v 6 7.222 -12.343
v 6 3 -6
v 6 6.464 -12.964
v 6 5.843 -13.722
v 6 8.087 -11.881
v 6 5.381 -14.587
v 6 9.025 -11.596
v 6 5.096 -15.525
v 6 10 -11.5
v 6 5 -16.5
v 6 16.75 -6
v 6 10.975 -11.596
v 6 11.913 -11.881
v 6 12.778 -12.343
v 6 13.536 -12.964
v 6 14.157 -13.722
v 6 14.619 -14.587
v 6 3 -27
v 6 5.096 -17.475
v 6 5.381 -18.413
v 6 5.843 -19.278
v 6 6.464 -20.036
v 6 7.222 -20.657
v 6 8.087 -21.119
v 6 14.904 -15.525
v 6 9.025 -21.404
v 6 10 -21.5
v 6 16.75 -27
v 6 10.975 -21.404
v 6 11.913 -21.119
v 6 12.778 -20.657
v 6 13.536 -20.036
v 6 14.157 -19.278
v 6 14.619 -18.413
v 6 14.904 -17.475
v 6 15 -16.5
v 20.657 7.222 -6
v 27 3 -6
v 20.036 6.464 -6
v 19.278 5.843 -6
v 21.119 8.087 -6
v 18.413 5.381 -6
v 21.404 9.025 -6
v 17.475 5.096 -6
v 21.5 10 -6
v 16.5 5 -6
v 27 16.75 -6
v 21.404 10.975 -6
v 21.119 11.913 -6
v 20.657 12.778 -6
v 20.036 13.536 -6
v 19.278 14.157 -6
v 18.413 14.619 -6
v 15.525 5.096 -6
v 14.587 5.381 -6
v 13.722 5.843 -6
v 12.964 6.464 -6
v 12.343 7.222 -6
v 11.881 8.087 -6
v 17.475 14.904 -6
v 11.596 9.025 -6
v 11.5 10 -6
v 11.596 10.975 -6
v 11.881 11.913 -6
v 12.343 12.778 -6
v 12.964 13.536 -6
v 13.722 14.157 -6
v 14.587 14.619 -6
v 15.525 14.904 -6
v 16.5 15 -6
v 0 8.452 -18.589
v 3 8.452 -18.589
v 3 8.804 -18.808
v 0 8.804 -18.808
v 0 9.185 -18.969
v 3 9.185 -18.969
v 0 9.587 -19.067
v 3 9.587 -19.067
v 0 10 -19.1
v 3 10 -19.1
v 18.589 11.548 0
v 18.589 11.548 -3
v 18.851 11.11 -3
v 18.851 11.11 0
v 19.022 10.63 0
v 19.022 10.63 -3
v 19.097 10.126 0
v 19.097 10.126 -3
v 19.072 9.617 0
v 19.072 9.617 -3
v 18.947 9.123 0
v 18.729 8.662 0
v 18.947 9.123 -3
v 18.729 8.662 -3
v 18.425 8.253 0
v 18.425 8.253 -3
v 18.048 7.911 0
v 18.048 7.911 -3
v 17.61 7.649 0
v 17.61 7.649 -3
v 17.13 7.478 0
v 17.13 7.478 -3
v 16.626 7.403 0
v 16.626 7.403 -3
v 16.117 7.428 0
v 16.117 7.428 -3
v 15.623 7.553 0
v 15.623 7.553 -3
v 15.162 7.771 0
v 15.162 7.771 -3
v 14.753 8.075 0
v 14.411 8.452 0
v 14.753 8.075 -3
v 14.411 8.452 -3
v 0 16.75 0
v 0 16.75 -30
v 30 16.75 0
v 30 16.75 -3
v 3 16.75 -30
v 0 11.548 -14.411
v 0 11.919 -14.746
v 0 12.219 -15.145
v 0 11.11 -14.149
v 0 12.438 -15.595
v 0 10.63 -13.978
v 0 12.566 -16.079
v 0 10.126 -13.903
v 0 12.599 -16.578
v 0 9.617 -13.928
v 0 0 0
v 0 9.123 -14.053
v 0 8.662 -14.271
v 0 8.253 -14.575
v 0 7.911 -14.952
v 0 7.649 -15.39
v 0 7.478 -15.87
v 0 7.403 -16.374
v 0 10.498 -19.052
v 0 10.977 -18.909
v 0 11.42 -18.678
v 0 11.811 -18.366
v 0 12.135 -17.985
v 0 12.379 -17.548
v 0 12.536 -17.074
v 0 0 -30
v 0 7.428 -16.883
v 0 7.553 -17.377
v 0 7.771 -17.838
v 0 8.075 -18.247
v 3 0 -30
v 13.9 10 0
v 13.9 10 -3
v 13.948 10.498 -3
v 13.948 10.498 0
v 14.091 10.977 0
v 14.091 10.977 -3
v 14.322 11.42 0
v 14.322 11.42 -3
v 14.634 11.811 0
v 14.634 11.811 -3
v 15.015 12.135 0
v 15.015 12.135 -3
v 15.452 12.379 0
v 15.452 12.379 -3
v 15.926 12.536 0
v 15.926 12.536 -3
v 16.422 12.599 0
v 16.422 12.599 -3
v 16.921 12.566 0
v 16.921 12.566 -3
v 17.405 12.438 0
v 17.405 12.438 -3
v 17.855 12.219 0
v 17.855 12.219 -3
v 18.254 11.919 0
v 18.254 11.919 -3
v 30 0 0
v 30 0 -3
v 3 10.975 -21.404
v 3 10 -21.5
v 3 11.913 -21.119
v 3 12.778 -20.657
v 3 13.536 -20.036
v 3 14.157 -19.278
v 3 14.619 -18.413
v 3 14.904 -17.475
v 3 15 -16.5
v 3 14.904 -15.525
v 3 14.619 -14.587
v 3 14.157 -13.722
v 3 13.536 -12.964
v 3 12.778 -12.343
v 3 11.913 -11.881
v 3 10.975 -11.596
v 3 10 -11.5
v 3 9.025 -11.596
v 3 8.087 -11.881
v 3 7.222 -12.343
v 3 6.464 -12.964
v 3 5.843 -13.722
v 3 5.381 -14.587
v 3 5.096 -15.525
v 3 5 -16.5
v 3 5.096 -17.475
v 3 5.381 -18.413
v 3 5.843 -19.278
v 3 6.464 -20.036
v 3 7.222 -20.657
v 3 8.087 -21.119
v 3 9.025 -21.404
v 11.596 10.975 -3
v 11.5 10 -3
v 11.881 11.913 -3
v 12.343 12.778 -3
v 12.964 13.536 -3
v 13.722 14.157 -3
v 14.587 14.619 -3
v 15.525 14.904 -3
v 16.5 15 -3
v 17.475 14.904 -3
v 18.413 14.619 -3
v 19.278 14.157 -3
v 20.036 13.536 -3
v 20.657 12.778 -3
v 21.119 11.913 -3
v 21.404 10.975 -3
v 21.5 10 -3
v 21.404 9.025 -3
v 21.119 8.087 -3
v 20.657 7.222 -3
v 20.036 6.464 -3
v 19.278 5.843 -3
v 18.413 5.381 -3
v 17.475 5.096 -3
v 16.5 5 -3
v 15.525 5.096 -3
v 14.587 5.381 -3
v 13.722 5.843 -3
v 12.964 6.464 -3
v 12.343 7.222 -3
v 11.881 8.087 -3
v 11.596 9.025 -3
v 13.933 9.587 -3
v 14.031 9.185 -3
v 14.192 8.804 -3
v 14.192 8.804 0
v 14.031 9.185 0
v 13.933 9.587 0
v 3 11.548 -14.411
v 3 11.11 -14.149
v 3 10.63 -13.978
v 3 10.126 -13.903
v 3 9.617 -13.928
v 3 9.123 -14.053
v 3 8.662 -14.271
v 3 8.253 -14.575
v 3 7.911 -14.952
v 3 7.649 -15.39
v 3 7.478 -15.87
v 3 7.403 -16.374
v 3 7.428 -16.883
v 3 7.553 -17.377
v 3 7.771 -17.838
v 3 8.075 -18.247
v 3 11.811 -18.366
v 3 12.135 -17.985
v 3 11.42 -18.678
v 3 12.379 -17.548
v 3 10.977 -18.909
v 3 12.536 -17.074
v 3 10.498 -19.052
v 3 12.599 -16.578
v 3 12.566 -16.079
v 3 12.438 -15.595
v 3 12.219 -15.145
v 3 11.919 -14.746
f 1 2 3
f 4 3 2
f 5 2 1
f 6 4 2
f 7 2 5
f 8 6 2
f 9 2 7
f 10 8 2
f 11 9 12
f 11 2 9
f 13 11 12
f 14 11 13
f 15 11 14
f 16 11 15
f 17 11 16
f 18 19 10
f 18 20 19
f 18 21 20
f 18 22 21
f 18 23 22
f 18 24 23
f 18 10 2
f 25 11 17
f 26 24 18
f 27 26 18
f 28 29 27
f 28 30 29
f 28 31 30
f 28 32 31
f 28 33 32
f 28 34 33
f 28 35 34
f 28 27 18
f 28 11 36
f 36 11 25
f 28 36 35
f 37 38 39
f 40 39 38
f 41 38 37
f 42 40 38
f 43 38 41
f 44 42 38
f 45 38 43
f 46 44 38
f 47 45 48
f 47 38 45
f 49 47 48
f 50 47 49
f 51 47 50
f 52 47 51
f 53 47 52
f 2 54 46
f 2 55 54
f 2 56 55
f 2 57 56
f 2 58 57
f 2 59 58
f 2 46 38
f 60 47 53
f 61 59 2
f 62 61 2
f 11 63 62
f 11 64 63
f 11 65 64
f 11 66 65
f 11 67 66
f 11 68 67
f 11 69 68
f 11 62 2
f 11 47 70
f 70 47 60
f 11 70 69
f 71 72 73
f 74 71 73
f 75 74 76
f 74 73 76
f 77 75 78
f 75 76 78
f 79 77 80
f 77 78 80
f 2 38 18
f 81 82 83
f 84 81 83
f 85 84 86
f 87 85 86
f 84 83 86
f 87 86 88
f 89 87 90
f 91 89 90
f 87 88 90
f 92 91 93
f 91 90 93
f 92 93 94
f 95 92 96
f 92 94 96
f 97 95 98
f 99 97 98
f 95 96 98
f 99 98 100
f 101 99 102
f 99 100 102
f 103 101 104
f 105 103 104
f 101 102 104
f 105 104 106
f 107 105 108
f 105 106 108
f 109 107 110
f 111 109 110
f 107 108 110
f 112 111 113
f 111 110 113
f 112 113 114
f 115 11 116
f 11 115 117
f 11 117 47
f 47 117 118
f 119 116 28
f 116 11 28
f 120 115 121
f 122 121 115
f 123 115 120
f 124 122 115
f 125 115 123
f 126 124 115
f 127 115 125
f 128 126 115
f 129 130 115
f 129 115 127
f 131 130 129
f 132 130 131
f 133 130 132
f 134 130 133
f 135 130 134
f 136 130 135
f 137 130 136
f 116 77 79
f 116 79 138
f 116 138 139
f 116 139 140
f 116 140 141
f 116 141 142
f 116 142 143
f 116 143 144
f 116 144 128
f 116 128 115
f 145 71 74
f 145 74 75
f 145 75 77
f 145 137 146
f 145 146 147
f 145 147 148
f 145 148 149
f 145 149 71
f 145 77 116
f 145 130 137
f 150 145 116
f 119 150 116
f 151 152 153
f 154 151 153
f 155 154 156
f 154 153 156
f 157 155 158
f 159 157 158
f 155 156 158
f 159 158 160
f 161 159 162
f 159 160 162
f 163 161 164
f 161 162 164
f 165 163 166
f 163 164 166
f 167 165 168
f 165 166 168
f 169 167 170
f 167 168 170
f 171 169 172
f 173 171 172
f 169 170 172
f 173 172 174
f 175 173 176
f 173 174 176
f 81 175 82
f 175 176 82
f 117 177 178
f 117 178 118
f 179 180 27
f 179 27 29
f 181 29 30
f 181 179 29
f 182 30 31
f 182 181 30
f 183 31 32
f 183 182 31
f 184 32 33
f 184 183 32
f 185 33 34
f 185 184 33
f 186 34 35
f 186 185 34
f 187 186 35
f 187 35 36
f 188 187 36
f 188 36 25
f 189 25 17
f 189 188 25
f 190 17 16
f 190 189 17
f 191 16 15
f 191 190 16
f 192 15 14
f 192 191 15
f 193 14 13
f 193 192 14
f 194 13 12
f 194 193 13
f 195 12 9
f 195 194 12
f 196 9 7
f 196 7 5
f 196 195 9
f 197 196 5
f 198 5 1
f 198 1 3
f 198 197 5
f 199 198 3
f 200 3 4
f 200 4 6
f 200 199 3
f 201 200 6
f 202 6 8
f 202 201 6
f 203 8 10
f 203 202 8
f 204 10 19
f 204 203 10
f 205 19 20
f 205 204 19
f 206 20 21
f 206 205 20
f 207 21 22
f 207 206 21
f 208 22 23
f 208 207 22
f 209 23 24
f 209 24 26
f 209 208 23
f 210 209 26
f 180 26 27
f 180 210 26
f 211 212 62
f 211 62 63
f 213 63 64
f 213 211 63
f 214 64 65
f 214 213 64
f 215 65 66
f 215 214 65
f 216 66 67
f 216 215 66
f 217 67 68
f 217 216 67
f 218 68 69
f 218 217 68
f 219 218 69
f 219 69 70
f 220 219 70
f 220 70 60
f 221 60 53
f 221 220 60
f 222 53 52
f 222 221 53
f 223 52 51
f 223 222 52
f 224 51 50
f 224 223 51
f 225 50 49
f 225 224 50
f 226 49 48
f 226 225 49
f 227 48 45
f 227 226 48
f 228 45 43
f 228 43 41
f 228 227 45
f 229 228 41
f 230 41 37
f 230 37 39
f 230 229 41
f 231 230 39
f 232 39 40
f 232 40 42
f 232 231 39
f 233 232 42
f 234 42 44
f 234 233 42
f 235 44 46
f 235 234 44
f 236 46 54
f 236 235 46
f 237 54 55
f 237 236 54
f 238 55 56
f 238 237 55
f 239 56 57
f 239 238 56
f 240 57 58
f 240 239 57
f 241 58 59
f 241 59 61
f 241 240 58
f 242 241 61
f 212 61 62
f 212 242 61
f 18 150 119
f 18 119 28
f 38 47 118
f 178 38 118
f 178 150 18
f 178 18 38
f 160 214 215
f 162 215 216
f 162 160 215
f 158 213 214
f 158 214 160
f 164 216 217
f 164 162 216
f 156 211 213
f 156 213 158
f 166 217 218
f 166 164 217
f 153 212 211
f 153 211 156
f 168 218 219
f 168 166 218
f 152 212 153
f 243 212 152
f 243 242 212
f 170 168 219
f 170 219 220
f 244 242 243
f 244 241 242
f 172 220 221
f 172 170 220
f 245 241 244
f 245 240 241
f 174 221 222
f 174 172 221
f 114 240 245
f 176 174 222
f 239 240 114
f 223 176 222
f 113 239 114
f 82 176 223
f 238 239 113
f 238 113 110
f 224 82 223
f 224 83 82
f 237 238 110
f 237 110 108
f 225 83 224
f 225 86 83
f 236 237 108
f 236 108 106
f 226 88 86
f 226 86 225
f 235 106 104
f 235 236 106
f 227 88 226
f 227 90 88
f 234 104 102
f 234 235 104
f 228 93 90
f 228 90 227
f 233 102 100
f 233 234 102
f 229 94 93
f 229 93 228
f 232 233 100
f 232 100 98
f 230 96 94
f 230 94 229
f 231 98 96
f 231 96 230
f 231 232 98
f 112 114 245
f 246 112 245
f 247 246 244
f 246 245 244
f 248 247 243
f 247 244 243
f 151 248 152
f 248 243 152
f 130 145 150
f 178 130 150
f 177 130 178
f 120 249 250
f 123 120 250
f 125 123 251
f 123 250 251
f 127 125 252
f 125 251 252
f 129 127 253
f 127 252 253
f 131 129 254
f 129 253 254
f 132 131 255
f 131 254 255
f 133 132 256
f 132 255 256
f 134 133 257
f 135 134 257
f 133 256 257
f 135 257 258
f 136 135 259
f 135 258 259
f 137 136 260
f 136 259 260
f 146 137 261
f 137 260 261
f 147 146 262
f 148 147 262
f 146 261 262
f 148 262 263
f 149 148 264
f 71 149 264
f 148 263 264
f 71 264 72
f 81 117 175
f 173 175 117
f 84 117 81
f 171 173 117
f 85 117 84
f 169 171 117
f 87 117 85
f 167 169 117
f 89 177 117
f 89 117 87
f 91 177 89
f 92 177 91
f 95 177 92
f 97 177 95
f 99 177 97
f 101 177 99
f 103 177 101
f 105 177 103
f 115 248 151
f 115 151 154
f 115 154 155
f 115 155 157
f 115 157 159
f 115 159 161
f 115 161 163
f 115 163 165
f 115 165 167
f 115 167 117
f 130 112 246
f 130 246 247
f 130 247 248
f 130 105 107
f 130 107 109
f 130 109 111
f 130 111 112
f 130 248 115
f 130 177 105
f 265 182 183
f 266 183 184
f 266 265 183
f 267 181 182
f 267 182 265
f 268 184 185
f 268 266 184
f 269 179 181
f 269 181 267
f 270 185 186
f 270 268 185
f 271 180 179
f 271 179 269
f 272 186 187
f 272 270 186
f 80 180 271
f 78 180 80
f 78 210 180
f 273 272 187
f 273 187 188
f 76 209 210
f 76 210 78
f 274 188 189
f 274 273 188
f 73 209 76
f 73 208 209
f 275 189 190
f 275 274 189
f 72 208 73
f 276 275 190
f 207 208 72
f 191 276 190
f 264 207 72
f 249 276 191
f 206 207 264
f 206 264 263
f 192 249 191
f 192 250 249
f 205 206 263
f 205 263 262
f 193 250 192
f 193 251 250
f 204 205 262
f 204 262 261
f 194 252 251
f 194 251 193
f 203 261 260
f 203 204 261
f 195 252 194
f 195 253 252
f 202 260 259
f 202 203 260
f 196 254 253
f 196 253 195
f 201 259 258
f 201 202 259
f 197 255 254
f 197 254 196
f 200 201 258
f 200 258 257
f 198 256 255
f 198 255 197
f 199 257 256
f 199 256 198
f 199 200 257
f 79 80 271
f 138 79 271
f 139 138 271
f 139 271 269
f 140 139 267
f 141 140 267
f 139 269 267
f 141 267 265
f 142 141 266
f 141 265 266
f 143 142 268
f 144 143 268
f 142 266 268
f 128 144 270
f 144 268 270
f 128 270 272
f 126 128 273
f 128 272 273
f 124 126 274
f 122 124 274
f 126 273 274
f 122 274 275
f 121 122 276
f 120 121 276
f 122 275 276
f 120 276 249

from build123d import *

# Parameters (mm, degrees)
EXTRUDE_1_DEPTH     = 20
EXTRUDE_2_DEPTH     = 2
CUT_EXTRUDE_2_DEPTH = 30
CUT_EXTRUDE_3_DEPTH = 30
SKETCH_8_W          = 27
SKETCH_8_H          = 18
SKETCH_8_R          = 5
EXTRUDE_3_DEPTH     = 3
SKETCH_9_W          = 24
SKETCH_9_H          = 18
SKETCH_9_R          = 5
EXTRUDE_4_DEPTH     = 3
CUT_EXTRUDE_4_DEPTH = 30
SKETCH_12_W         = 30
SKETCH_12_H         = 3.25
CUT_EXTRUDE_5_DEPTH = 30
EXTRUDE_5_DEPTH     = 3


with BuildPart() as part:
    # 草图1 → 凸台-拉伸1 (new body)
    with BuildSketch(Plane(origin=(0, 0, 0), x_dir=(1, 0, 0), z_dir=(0, 1, 0))):
        Polygon((0, 0), (0, 30), (3, 30), (3, 3), (30, 3), (30, 0), align=None)
    extrude(amount=EXTRUDE_1_DEPTH)

    # 草图2 → 凸台-拉伸2 (add)
    with BuildSketch(Plane.XZ):
        Polygon((3, -30), (30, -3), (3, -3), align=None)
    extrude(amount=-EXTRUDE_2_DEPTH)

    # 草图5 → 切除-拉伸2 (cut)
    with BuildSketch(Plane(origin=(0, 0, -3), x_dir=(-1, 0, 0), z_dir=(0, 0, -1))):
        with BuildLine():
            ThreePointArc((-13.9, 10), (-15.685152354, 12.469012619), (-18.589248703, 11.547591632))
            Line((-18.589248703, 11.547591632), (-14.410751297, 8.452408368))
            ThreePointArc((-14.410751297, 8.452408368), (-14.030987381, 9.185152354), (-13.9, 10))
        make_face()
        with BuildLine():
            Line((-14.410751297, 8.452408368), (-18.589248703, 11.547591632))
            ThreePointArc((-18.589248703, 11.547591632), (-18.047591632, 7.910751297), (-14.410751297, 8.452408368))
        make_face()
    extrude(amount=-CUT_EXTRUDE_2_DEPTH, mode=Mode.SUBTRACT)

    # 草图7 → 切除-拉伸3 (cut)
    with BuildSketch(Plane(origin=(3, 0, 0), x_dir=(0, 0, -1), z_dir=(1, 0, 0))):
        with BuildLine():
            ThreePointArc((19.1, 10), (17.314847646, 12.469012619), (14.410751297, 11.547591632))
            Line((14.410751297, 11.547591632), (18.589248703, 8.452408368))
            ThreePointArc((18.589248703, 8.452408368), (18.969012619, 9.185152354), (19.1, 10))
        make_face()
        with BuildLine():
            Line((18.589248703, 8.452408368), (14.410751297, 11.547591632))
            ThreePointArc((14.410751297, 11.547591632), (14.952408368, 7.910751297), (18.589248703, 8.452408368))
        make_face()
    extrude(amount=-CUT_EXTRUDE_3_DEPTH, mode=Mode.SUBTRACT)

    # 草图8 → 凸台-拉伸3 (add)
    with BuildSketch(Plane(origin=(0, 0, -3), x_dir=(-1, 0, 0), z_dir=(0, 0, -1))):
        with Locations((-16.5, 11)):
            Rectangle(SKETCH_8_W, SKETCH_8_H)
        with Locations((-16.5, 10)):
            Circle(SKETCH_8_R, mode=Mode.SUBTRACT)
    extrude(amount=EXTRUDE_3_DEPTH)

    # 草图9 → 凸台-拉伸4 (add)
    with BuildSketch(Plane(origin=(3, 0, 0), x_dir=(0, 0, -1), z_dir=(1, 0, 0))):
        with Locations((18, 11)):
            Rectangle(SKETCH_9_W, SKETCH_9_H)
        with Locations((16.5, 10)):
            Circle(SKETCH_9_R, mode=Mode.SUBTRACT)
    extrude(amount=EXTRUDE_4_DEPTH)

    # 草图10 → 切除-拉伸4 (cut)
    with BuildSketch(Plane.XZ.offset(-2)):
        Polygon((3, -30), (6, -27), (6, -30), align=None)
        Polygon((27, -6), (30, -3), (30, -6), align=None)
    extrude(amount=-CUT_EXTRUDE_4_DEPTH, mode=Mode.SUBTRACT)

    # 草图12 → 切除-拉伸5 (cut)
    with BuildSketch(Plane(origin=(30, 0, 0), x_dir=(0, 0, -1), z_dir=(1, 0, 0))):
        with Locations((15, 18.375)):
            Rectangle(SKETCH_12_W, SKETCH_12_H)
    extrude(amount=-CUT_EXTRUDE_5_DEPTH, mode=Mode.SUBTRACT)

    # 草图13 → 凸台-拉伸5 (add)
    with BuildSketch(Plane.XZ):
        Polygon((3, -30), (3, -3), (30, -3), align=None)
    extrude(amount=-EXTRUDE_5_DEPTH)


solid = part.part
